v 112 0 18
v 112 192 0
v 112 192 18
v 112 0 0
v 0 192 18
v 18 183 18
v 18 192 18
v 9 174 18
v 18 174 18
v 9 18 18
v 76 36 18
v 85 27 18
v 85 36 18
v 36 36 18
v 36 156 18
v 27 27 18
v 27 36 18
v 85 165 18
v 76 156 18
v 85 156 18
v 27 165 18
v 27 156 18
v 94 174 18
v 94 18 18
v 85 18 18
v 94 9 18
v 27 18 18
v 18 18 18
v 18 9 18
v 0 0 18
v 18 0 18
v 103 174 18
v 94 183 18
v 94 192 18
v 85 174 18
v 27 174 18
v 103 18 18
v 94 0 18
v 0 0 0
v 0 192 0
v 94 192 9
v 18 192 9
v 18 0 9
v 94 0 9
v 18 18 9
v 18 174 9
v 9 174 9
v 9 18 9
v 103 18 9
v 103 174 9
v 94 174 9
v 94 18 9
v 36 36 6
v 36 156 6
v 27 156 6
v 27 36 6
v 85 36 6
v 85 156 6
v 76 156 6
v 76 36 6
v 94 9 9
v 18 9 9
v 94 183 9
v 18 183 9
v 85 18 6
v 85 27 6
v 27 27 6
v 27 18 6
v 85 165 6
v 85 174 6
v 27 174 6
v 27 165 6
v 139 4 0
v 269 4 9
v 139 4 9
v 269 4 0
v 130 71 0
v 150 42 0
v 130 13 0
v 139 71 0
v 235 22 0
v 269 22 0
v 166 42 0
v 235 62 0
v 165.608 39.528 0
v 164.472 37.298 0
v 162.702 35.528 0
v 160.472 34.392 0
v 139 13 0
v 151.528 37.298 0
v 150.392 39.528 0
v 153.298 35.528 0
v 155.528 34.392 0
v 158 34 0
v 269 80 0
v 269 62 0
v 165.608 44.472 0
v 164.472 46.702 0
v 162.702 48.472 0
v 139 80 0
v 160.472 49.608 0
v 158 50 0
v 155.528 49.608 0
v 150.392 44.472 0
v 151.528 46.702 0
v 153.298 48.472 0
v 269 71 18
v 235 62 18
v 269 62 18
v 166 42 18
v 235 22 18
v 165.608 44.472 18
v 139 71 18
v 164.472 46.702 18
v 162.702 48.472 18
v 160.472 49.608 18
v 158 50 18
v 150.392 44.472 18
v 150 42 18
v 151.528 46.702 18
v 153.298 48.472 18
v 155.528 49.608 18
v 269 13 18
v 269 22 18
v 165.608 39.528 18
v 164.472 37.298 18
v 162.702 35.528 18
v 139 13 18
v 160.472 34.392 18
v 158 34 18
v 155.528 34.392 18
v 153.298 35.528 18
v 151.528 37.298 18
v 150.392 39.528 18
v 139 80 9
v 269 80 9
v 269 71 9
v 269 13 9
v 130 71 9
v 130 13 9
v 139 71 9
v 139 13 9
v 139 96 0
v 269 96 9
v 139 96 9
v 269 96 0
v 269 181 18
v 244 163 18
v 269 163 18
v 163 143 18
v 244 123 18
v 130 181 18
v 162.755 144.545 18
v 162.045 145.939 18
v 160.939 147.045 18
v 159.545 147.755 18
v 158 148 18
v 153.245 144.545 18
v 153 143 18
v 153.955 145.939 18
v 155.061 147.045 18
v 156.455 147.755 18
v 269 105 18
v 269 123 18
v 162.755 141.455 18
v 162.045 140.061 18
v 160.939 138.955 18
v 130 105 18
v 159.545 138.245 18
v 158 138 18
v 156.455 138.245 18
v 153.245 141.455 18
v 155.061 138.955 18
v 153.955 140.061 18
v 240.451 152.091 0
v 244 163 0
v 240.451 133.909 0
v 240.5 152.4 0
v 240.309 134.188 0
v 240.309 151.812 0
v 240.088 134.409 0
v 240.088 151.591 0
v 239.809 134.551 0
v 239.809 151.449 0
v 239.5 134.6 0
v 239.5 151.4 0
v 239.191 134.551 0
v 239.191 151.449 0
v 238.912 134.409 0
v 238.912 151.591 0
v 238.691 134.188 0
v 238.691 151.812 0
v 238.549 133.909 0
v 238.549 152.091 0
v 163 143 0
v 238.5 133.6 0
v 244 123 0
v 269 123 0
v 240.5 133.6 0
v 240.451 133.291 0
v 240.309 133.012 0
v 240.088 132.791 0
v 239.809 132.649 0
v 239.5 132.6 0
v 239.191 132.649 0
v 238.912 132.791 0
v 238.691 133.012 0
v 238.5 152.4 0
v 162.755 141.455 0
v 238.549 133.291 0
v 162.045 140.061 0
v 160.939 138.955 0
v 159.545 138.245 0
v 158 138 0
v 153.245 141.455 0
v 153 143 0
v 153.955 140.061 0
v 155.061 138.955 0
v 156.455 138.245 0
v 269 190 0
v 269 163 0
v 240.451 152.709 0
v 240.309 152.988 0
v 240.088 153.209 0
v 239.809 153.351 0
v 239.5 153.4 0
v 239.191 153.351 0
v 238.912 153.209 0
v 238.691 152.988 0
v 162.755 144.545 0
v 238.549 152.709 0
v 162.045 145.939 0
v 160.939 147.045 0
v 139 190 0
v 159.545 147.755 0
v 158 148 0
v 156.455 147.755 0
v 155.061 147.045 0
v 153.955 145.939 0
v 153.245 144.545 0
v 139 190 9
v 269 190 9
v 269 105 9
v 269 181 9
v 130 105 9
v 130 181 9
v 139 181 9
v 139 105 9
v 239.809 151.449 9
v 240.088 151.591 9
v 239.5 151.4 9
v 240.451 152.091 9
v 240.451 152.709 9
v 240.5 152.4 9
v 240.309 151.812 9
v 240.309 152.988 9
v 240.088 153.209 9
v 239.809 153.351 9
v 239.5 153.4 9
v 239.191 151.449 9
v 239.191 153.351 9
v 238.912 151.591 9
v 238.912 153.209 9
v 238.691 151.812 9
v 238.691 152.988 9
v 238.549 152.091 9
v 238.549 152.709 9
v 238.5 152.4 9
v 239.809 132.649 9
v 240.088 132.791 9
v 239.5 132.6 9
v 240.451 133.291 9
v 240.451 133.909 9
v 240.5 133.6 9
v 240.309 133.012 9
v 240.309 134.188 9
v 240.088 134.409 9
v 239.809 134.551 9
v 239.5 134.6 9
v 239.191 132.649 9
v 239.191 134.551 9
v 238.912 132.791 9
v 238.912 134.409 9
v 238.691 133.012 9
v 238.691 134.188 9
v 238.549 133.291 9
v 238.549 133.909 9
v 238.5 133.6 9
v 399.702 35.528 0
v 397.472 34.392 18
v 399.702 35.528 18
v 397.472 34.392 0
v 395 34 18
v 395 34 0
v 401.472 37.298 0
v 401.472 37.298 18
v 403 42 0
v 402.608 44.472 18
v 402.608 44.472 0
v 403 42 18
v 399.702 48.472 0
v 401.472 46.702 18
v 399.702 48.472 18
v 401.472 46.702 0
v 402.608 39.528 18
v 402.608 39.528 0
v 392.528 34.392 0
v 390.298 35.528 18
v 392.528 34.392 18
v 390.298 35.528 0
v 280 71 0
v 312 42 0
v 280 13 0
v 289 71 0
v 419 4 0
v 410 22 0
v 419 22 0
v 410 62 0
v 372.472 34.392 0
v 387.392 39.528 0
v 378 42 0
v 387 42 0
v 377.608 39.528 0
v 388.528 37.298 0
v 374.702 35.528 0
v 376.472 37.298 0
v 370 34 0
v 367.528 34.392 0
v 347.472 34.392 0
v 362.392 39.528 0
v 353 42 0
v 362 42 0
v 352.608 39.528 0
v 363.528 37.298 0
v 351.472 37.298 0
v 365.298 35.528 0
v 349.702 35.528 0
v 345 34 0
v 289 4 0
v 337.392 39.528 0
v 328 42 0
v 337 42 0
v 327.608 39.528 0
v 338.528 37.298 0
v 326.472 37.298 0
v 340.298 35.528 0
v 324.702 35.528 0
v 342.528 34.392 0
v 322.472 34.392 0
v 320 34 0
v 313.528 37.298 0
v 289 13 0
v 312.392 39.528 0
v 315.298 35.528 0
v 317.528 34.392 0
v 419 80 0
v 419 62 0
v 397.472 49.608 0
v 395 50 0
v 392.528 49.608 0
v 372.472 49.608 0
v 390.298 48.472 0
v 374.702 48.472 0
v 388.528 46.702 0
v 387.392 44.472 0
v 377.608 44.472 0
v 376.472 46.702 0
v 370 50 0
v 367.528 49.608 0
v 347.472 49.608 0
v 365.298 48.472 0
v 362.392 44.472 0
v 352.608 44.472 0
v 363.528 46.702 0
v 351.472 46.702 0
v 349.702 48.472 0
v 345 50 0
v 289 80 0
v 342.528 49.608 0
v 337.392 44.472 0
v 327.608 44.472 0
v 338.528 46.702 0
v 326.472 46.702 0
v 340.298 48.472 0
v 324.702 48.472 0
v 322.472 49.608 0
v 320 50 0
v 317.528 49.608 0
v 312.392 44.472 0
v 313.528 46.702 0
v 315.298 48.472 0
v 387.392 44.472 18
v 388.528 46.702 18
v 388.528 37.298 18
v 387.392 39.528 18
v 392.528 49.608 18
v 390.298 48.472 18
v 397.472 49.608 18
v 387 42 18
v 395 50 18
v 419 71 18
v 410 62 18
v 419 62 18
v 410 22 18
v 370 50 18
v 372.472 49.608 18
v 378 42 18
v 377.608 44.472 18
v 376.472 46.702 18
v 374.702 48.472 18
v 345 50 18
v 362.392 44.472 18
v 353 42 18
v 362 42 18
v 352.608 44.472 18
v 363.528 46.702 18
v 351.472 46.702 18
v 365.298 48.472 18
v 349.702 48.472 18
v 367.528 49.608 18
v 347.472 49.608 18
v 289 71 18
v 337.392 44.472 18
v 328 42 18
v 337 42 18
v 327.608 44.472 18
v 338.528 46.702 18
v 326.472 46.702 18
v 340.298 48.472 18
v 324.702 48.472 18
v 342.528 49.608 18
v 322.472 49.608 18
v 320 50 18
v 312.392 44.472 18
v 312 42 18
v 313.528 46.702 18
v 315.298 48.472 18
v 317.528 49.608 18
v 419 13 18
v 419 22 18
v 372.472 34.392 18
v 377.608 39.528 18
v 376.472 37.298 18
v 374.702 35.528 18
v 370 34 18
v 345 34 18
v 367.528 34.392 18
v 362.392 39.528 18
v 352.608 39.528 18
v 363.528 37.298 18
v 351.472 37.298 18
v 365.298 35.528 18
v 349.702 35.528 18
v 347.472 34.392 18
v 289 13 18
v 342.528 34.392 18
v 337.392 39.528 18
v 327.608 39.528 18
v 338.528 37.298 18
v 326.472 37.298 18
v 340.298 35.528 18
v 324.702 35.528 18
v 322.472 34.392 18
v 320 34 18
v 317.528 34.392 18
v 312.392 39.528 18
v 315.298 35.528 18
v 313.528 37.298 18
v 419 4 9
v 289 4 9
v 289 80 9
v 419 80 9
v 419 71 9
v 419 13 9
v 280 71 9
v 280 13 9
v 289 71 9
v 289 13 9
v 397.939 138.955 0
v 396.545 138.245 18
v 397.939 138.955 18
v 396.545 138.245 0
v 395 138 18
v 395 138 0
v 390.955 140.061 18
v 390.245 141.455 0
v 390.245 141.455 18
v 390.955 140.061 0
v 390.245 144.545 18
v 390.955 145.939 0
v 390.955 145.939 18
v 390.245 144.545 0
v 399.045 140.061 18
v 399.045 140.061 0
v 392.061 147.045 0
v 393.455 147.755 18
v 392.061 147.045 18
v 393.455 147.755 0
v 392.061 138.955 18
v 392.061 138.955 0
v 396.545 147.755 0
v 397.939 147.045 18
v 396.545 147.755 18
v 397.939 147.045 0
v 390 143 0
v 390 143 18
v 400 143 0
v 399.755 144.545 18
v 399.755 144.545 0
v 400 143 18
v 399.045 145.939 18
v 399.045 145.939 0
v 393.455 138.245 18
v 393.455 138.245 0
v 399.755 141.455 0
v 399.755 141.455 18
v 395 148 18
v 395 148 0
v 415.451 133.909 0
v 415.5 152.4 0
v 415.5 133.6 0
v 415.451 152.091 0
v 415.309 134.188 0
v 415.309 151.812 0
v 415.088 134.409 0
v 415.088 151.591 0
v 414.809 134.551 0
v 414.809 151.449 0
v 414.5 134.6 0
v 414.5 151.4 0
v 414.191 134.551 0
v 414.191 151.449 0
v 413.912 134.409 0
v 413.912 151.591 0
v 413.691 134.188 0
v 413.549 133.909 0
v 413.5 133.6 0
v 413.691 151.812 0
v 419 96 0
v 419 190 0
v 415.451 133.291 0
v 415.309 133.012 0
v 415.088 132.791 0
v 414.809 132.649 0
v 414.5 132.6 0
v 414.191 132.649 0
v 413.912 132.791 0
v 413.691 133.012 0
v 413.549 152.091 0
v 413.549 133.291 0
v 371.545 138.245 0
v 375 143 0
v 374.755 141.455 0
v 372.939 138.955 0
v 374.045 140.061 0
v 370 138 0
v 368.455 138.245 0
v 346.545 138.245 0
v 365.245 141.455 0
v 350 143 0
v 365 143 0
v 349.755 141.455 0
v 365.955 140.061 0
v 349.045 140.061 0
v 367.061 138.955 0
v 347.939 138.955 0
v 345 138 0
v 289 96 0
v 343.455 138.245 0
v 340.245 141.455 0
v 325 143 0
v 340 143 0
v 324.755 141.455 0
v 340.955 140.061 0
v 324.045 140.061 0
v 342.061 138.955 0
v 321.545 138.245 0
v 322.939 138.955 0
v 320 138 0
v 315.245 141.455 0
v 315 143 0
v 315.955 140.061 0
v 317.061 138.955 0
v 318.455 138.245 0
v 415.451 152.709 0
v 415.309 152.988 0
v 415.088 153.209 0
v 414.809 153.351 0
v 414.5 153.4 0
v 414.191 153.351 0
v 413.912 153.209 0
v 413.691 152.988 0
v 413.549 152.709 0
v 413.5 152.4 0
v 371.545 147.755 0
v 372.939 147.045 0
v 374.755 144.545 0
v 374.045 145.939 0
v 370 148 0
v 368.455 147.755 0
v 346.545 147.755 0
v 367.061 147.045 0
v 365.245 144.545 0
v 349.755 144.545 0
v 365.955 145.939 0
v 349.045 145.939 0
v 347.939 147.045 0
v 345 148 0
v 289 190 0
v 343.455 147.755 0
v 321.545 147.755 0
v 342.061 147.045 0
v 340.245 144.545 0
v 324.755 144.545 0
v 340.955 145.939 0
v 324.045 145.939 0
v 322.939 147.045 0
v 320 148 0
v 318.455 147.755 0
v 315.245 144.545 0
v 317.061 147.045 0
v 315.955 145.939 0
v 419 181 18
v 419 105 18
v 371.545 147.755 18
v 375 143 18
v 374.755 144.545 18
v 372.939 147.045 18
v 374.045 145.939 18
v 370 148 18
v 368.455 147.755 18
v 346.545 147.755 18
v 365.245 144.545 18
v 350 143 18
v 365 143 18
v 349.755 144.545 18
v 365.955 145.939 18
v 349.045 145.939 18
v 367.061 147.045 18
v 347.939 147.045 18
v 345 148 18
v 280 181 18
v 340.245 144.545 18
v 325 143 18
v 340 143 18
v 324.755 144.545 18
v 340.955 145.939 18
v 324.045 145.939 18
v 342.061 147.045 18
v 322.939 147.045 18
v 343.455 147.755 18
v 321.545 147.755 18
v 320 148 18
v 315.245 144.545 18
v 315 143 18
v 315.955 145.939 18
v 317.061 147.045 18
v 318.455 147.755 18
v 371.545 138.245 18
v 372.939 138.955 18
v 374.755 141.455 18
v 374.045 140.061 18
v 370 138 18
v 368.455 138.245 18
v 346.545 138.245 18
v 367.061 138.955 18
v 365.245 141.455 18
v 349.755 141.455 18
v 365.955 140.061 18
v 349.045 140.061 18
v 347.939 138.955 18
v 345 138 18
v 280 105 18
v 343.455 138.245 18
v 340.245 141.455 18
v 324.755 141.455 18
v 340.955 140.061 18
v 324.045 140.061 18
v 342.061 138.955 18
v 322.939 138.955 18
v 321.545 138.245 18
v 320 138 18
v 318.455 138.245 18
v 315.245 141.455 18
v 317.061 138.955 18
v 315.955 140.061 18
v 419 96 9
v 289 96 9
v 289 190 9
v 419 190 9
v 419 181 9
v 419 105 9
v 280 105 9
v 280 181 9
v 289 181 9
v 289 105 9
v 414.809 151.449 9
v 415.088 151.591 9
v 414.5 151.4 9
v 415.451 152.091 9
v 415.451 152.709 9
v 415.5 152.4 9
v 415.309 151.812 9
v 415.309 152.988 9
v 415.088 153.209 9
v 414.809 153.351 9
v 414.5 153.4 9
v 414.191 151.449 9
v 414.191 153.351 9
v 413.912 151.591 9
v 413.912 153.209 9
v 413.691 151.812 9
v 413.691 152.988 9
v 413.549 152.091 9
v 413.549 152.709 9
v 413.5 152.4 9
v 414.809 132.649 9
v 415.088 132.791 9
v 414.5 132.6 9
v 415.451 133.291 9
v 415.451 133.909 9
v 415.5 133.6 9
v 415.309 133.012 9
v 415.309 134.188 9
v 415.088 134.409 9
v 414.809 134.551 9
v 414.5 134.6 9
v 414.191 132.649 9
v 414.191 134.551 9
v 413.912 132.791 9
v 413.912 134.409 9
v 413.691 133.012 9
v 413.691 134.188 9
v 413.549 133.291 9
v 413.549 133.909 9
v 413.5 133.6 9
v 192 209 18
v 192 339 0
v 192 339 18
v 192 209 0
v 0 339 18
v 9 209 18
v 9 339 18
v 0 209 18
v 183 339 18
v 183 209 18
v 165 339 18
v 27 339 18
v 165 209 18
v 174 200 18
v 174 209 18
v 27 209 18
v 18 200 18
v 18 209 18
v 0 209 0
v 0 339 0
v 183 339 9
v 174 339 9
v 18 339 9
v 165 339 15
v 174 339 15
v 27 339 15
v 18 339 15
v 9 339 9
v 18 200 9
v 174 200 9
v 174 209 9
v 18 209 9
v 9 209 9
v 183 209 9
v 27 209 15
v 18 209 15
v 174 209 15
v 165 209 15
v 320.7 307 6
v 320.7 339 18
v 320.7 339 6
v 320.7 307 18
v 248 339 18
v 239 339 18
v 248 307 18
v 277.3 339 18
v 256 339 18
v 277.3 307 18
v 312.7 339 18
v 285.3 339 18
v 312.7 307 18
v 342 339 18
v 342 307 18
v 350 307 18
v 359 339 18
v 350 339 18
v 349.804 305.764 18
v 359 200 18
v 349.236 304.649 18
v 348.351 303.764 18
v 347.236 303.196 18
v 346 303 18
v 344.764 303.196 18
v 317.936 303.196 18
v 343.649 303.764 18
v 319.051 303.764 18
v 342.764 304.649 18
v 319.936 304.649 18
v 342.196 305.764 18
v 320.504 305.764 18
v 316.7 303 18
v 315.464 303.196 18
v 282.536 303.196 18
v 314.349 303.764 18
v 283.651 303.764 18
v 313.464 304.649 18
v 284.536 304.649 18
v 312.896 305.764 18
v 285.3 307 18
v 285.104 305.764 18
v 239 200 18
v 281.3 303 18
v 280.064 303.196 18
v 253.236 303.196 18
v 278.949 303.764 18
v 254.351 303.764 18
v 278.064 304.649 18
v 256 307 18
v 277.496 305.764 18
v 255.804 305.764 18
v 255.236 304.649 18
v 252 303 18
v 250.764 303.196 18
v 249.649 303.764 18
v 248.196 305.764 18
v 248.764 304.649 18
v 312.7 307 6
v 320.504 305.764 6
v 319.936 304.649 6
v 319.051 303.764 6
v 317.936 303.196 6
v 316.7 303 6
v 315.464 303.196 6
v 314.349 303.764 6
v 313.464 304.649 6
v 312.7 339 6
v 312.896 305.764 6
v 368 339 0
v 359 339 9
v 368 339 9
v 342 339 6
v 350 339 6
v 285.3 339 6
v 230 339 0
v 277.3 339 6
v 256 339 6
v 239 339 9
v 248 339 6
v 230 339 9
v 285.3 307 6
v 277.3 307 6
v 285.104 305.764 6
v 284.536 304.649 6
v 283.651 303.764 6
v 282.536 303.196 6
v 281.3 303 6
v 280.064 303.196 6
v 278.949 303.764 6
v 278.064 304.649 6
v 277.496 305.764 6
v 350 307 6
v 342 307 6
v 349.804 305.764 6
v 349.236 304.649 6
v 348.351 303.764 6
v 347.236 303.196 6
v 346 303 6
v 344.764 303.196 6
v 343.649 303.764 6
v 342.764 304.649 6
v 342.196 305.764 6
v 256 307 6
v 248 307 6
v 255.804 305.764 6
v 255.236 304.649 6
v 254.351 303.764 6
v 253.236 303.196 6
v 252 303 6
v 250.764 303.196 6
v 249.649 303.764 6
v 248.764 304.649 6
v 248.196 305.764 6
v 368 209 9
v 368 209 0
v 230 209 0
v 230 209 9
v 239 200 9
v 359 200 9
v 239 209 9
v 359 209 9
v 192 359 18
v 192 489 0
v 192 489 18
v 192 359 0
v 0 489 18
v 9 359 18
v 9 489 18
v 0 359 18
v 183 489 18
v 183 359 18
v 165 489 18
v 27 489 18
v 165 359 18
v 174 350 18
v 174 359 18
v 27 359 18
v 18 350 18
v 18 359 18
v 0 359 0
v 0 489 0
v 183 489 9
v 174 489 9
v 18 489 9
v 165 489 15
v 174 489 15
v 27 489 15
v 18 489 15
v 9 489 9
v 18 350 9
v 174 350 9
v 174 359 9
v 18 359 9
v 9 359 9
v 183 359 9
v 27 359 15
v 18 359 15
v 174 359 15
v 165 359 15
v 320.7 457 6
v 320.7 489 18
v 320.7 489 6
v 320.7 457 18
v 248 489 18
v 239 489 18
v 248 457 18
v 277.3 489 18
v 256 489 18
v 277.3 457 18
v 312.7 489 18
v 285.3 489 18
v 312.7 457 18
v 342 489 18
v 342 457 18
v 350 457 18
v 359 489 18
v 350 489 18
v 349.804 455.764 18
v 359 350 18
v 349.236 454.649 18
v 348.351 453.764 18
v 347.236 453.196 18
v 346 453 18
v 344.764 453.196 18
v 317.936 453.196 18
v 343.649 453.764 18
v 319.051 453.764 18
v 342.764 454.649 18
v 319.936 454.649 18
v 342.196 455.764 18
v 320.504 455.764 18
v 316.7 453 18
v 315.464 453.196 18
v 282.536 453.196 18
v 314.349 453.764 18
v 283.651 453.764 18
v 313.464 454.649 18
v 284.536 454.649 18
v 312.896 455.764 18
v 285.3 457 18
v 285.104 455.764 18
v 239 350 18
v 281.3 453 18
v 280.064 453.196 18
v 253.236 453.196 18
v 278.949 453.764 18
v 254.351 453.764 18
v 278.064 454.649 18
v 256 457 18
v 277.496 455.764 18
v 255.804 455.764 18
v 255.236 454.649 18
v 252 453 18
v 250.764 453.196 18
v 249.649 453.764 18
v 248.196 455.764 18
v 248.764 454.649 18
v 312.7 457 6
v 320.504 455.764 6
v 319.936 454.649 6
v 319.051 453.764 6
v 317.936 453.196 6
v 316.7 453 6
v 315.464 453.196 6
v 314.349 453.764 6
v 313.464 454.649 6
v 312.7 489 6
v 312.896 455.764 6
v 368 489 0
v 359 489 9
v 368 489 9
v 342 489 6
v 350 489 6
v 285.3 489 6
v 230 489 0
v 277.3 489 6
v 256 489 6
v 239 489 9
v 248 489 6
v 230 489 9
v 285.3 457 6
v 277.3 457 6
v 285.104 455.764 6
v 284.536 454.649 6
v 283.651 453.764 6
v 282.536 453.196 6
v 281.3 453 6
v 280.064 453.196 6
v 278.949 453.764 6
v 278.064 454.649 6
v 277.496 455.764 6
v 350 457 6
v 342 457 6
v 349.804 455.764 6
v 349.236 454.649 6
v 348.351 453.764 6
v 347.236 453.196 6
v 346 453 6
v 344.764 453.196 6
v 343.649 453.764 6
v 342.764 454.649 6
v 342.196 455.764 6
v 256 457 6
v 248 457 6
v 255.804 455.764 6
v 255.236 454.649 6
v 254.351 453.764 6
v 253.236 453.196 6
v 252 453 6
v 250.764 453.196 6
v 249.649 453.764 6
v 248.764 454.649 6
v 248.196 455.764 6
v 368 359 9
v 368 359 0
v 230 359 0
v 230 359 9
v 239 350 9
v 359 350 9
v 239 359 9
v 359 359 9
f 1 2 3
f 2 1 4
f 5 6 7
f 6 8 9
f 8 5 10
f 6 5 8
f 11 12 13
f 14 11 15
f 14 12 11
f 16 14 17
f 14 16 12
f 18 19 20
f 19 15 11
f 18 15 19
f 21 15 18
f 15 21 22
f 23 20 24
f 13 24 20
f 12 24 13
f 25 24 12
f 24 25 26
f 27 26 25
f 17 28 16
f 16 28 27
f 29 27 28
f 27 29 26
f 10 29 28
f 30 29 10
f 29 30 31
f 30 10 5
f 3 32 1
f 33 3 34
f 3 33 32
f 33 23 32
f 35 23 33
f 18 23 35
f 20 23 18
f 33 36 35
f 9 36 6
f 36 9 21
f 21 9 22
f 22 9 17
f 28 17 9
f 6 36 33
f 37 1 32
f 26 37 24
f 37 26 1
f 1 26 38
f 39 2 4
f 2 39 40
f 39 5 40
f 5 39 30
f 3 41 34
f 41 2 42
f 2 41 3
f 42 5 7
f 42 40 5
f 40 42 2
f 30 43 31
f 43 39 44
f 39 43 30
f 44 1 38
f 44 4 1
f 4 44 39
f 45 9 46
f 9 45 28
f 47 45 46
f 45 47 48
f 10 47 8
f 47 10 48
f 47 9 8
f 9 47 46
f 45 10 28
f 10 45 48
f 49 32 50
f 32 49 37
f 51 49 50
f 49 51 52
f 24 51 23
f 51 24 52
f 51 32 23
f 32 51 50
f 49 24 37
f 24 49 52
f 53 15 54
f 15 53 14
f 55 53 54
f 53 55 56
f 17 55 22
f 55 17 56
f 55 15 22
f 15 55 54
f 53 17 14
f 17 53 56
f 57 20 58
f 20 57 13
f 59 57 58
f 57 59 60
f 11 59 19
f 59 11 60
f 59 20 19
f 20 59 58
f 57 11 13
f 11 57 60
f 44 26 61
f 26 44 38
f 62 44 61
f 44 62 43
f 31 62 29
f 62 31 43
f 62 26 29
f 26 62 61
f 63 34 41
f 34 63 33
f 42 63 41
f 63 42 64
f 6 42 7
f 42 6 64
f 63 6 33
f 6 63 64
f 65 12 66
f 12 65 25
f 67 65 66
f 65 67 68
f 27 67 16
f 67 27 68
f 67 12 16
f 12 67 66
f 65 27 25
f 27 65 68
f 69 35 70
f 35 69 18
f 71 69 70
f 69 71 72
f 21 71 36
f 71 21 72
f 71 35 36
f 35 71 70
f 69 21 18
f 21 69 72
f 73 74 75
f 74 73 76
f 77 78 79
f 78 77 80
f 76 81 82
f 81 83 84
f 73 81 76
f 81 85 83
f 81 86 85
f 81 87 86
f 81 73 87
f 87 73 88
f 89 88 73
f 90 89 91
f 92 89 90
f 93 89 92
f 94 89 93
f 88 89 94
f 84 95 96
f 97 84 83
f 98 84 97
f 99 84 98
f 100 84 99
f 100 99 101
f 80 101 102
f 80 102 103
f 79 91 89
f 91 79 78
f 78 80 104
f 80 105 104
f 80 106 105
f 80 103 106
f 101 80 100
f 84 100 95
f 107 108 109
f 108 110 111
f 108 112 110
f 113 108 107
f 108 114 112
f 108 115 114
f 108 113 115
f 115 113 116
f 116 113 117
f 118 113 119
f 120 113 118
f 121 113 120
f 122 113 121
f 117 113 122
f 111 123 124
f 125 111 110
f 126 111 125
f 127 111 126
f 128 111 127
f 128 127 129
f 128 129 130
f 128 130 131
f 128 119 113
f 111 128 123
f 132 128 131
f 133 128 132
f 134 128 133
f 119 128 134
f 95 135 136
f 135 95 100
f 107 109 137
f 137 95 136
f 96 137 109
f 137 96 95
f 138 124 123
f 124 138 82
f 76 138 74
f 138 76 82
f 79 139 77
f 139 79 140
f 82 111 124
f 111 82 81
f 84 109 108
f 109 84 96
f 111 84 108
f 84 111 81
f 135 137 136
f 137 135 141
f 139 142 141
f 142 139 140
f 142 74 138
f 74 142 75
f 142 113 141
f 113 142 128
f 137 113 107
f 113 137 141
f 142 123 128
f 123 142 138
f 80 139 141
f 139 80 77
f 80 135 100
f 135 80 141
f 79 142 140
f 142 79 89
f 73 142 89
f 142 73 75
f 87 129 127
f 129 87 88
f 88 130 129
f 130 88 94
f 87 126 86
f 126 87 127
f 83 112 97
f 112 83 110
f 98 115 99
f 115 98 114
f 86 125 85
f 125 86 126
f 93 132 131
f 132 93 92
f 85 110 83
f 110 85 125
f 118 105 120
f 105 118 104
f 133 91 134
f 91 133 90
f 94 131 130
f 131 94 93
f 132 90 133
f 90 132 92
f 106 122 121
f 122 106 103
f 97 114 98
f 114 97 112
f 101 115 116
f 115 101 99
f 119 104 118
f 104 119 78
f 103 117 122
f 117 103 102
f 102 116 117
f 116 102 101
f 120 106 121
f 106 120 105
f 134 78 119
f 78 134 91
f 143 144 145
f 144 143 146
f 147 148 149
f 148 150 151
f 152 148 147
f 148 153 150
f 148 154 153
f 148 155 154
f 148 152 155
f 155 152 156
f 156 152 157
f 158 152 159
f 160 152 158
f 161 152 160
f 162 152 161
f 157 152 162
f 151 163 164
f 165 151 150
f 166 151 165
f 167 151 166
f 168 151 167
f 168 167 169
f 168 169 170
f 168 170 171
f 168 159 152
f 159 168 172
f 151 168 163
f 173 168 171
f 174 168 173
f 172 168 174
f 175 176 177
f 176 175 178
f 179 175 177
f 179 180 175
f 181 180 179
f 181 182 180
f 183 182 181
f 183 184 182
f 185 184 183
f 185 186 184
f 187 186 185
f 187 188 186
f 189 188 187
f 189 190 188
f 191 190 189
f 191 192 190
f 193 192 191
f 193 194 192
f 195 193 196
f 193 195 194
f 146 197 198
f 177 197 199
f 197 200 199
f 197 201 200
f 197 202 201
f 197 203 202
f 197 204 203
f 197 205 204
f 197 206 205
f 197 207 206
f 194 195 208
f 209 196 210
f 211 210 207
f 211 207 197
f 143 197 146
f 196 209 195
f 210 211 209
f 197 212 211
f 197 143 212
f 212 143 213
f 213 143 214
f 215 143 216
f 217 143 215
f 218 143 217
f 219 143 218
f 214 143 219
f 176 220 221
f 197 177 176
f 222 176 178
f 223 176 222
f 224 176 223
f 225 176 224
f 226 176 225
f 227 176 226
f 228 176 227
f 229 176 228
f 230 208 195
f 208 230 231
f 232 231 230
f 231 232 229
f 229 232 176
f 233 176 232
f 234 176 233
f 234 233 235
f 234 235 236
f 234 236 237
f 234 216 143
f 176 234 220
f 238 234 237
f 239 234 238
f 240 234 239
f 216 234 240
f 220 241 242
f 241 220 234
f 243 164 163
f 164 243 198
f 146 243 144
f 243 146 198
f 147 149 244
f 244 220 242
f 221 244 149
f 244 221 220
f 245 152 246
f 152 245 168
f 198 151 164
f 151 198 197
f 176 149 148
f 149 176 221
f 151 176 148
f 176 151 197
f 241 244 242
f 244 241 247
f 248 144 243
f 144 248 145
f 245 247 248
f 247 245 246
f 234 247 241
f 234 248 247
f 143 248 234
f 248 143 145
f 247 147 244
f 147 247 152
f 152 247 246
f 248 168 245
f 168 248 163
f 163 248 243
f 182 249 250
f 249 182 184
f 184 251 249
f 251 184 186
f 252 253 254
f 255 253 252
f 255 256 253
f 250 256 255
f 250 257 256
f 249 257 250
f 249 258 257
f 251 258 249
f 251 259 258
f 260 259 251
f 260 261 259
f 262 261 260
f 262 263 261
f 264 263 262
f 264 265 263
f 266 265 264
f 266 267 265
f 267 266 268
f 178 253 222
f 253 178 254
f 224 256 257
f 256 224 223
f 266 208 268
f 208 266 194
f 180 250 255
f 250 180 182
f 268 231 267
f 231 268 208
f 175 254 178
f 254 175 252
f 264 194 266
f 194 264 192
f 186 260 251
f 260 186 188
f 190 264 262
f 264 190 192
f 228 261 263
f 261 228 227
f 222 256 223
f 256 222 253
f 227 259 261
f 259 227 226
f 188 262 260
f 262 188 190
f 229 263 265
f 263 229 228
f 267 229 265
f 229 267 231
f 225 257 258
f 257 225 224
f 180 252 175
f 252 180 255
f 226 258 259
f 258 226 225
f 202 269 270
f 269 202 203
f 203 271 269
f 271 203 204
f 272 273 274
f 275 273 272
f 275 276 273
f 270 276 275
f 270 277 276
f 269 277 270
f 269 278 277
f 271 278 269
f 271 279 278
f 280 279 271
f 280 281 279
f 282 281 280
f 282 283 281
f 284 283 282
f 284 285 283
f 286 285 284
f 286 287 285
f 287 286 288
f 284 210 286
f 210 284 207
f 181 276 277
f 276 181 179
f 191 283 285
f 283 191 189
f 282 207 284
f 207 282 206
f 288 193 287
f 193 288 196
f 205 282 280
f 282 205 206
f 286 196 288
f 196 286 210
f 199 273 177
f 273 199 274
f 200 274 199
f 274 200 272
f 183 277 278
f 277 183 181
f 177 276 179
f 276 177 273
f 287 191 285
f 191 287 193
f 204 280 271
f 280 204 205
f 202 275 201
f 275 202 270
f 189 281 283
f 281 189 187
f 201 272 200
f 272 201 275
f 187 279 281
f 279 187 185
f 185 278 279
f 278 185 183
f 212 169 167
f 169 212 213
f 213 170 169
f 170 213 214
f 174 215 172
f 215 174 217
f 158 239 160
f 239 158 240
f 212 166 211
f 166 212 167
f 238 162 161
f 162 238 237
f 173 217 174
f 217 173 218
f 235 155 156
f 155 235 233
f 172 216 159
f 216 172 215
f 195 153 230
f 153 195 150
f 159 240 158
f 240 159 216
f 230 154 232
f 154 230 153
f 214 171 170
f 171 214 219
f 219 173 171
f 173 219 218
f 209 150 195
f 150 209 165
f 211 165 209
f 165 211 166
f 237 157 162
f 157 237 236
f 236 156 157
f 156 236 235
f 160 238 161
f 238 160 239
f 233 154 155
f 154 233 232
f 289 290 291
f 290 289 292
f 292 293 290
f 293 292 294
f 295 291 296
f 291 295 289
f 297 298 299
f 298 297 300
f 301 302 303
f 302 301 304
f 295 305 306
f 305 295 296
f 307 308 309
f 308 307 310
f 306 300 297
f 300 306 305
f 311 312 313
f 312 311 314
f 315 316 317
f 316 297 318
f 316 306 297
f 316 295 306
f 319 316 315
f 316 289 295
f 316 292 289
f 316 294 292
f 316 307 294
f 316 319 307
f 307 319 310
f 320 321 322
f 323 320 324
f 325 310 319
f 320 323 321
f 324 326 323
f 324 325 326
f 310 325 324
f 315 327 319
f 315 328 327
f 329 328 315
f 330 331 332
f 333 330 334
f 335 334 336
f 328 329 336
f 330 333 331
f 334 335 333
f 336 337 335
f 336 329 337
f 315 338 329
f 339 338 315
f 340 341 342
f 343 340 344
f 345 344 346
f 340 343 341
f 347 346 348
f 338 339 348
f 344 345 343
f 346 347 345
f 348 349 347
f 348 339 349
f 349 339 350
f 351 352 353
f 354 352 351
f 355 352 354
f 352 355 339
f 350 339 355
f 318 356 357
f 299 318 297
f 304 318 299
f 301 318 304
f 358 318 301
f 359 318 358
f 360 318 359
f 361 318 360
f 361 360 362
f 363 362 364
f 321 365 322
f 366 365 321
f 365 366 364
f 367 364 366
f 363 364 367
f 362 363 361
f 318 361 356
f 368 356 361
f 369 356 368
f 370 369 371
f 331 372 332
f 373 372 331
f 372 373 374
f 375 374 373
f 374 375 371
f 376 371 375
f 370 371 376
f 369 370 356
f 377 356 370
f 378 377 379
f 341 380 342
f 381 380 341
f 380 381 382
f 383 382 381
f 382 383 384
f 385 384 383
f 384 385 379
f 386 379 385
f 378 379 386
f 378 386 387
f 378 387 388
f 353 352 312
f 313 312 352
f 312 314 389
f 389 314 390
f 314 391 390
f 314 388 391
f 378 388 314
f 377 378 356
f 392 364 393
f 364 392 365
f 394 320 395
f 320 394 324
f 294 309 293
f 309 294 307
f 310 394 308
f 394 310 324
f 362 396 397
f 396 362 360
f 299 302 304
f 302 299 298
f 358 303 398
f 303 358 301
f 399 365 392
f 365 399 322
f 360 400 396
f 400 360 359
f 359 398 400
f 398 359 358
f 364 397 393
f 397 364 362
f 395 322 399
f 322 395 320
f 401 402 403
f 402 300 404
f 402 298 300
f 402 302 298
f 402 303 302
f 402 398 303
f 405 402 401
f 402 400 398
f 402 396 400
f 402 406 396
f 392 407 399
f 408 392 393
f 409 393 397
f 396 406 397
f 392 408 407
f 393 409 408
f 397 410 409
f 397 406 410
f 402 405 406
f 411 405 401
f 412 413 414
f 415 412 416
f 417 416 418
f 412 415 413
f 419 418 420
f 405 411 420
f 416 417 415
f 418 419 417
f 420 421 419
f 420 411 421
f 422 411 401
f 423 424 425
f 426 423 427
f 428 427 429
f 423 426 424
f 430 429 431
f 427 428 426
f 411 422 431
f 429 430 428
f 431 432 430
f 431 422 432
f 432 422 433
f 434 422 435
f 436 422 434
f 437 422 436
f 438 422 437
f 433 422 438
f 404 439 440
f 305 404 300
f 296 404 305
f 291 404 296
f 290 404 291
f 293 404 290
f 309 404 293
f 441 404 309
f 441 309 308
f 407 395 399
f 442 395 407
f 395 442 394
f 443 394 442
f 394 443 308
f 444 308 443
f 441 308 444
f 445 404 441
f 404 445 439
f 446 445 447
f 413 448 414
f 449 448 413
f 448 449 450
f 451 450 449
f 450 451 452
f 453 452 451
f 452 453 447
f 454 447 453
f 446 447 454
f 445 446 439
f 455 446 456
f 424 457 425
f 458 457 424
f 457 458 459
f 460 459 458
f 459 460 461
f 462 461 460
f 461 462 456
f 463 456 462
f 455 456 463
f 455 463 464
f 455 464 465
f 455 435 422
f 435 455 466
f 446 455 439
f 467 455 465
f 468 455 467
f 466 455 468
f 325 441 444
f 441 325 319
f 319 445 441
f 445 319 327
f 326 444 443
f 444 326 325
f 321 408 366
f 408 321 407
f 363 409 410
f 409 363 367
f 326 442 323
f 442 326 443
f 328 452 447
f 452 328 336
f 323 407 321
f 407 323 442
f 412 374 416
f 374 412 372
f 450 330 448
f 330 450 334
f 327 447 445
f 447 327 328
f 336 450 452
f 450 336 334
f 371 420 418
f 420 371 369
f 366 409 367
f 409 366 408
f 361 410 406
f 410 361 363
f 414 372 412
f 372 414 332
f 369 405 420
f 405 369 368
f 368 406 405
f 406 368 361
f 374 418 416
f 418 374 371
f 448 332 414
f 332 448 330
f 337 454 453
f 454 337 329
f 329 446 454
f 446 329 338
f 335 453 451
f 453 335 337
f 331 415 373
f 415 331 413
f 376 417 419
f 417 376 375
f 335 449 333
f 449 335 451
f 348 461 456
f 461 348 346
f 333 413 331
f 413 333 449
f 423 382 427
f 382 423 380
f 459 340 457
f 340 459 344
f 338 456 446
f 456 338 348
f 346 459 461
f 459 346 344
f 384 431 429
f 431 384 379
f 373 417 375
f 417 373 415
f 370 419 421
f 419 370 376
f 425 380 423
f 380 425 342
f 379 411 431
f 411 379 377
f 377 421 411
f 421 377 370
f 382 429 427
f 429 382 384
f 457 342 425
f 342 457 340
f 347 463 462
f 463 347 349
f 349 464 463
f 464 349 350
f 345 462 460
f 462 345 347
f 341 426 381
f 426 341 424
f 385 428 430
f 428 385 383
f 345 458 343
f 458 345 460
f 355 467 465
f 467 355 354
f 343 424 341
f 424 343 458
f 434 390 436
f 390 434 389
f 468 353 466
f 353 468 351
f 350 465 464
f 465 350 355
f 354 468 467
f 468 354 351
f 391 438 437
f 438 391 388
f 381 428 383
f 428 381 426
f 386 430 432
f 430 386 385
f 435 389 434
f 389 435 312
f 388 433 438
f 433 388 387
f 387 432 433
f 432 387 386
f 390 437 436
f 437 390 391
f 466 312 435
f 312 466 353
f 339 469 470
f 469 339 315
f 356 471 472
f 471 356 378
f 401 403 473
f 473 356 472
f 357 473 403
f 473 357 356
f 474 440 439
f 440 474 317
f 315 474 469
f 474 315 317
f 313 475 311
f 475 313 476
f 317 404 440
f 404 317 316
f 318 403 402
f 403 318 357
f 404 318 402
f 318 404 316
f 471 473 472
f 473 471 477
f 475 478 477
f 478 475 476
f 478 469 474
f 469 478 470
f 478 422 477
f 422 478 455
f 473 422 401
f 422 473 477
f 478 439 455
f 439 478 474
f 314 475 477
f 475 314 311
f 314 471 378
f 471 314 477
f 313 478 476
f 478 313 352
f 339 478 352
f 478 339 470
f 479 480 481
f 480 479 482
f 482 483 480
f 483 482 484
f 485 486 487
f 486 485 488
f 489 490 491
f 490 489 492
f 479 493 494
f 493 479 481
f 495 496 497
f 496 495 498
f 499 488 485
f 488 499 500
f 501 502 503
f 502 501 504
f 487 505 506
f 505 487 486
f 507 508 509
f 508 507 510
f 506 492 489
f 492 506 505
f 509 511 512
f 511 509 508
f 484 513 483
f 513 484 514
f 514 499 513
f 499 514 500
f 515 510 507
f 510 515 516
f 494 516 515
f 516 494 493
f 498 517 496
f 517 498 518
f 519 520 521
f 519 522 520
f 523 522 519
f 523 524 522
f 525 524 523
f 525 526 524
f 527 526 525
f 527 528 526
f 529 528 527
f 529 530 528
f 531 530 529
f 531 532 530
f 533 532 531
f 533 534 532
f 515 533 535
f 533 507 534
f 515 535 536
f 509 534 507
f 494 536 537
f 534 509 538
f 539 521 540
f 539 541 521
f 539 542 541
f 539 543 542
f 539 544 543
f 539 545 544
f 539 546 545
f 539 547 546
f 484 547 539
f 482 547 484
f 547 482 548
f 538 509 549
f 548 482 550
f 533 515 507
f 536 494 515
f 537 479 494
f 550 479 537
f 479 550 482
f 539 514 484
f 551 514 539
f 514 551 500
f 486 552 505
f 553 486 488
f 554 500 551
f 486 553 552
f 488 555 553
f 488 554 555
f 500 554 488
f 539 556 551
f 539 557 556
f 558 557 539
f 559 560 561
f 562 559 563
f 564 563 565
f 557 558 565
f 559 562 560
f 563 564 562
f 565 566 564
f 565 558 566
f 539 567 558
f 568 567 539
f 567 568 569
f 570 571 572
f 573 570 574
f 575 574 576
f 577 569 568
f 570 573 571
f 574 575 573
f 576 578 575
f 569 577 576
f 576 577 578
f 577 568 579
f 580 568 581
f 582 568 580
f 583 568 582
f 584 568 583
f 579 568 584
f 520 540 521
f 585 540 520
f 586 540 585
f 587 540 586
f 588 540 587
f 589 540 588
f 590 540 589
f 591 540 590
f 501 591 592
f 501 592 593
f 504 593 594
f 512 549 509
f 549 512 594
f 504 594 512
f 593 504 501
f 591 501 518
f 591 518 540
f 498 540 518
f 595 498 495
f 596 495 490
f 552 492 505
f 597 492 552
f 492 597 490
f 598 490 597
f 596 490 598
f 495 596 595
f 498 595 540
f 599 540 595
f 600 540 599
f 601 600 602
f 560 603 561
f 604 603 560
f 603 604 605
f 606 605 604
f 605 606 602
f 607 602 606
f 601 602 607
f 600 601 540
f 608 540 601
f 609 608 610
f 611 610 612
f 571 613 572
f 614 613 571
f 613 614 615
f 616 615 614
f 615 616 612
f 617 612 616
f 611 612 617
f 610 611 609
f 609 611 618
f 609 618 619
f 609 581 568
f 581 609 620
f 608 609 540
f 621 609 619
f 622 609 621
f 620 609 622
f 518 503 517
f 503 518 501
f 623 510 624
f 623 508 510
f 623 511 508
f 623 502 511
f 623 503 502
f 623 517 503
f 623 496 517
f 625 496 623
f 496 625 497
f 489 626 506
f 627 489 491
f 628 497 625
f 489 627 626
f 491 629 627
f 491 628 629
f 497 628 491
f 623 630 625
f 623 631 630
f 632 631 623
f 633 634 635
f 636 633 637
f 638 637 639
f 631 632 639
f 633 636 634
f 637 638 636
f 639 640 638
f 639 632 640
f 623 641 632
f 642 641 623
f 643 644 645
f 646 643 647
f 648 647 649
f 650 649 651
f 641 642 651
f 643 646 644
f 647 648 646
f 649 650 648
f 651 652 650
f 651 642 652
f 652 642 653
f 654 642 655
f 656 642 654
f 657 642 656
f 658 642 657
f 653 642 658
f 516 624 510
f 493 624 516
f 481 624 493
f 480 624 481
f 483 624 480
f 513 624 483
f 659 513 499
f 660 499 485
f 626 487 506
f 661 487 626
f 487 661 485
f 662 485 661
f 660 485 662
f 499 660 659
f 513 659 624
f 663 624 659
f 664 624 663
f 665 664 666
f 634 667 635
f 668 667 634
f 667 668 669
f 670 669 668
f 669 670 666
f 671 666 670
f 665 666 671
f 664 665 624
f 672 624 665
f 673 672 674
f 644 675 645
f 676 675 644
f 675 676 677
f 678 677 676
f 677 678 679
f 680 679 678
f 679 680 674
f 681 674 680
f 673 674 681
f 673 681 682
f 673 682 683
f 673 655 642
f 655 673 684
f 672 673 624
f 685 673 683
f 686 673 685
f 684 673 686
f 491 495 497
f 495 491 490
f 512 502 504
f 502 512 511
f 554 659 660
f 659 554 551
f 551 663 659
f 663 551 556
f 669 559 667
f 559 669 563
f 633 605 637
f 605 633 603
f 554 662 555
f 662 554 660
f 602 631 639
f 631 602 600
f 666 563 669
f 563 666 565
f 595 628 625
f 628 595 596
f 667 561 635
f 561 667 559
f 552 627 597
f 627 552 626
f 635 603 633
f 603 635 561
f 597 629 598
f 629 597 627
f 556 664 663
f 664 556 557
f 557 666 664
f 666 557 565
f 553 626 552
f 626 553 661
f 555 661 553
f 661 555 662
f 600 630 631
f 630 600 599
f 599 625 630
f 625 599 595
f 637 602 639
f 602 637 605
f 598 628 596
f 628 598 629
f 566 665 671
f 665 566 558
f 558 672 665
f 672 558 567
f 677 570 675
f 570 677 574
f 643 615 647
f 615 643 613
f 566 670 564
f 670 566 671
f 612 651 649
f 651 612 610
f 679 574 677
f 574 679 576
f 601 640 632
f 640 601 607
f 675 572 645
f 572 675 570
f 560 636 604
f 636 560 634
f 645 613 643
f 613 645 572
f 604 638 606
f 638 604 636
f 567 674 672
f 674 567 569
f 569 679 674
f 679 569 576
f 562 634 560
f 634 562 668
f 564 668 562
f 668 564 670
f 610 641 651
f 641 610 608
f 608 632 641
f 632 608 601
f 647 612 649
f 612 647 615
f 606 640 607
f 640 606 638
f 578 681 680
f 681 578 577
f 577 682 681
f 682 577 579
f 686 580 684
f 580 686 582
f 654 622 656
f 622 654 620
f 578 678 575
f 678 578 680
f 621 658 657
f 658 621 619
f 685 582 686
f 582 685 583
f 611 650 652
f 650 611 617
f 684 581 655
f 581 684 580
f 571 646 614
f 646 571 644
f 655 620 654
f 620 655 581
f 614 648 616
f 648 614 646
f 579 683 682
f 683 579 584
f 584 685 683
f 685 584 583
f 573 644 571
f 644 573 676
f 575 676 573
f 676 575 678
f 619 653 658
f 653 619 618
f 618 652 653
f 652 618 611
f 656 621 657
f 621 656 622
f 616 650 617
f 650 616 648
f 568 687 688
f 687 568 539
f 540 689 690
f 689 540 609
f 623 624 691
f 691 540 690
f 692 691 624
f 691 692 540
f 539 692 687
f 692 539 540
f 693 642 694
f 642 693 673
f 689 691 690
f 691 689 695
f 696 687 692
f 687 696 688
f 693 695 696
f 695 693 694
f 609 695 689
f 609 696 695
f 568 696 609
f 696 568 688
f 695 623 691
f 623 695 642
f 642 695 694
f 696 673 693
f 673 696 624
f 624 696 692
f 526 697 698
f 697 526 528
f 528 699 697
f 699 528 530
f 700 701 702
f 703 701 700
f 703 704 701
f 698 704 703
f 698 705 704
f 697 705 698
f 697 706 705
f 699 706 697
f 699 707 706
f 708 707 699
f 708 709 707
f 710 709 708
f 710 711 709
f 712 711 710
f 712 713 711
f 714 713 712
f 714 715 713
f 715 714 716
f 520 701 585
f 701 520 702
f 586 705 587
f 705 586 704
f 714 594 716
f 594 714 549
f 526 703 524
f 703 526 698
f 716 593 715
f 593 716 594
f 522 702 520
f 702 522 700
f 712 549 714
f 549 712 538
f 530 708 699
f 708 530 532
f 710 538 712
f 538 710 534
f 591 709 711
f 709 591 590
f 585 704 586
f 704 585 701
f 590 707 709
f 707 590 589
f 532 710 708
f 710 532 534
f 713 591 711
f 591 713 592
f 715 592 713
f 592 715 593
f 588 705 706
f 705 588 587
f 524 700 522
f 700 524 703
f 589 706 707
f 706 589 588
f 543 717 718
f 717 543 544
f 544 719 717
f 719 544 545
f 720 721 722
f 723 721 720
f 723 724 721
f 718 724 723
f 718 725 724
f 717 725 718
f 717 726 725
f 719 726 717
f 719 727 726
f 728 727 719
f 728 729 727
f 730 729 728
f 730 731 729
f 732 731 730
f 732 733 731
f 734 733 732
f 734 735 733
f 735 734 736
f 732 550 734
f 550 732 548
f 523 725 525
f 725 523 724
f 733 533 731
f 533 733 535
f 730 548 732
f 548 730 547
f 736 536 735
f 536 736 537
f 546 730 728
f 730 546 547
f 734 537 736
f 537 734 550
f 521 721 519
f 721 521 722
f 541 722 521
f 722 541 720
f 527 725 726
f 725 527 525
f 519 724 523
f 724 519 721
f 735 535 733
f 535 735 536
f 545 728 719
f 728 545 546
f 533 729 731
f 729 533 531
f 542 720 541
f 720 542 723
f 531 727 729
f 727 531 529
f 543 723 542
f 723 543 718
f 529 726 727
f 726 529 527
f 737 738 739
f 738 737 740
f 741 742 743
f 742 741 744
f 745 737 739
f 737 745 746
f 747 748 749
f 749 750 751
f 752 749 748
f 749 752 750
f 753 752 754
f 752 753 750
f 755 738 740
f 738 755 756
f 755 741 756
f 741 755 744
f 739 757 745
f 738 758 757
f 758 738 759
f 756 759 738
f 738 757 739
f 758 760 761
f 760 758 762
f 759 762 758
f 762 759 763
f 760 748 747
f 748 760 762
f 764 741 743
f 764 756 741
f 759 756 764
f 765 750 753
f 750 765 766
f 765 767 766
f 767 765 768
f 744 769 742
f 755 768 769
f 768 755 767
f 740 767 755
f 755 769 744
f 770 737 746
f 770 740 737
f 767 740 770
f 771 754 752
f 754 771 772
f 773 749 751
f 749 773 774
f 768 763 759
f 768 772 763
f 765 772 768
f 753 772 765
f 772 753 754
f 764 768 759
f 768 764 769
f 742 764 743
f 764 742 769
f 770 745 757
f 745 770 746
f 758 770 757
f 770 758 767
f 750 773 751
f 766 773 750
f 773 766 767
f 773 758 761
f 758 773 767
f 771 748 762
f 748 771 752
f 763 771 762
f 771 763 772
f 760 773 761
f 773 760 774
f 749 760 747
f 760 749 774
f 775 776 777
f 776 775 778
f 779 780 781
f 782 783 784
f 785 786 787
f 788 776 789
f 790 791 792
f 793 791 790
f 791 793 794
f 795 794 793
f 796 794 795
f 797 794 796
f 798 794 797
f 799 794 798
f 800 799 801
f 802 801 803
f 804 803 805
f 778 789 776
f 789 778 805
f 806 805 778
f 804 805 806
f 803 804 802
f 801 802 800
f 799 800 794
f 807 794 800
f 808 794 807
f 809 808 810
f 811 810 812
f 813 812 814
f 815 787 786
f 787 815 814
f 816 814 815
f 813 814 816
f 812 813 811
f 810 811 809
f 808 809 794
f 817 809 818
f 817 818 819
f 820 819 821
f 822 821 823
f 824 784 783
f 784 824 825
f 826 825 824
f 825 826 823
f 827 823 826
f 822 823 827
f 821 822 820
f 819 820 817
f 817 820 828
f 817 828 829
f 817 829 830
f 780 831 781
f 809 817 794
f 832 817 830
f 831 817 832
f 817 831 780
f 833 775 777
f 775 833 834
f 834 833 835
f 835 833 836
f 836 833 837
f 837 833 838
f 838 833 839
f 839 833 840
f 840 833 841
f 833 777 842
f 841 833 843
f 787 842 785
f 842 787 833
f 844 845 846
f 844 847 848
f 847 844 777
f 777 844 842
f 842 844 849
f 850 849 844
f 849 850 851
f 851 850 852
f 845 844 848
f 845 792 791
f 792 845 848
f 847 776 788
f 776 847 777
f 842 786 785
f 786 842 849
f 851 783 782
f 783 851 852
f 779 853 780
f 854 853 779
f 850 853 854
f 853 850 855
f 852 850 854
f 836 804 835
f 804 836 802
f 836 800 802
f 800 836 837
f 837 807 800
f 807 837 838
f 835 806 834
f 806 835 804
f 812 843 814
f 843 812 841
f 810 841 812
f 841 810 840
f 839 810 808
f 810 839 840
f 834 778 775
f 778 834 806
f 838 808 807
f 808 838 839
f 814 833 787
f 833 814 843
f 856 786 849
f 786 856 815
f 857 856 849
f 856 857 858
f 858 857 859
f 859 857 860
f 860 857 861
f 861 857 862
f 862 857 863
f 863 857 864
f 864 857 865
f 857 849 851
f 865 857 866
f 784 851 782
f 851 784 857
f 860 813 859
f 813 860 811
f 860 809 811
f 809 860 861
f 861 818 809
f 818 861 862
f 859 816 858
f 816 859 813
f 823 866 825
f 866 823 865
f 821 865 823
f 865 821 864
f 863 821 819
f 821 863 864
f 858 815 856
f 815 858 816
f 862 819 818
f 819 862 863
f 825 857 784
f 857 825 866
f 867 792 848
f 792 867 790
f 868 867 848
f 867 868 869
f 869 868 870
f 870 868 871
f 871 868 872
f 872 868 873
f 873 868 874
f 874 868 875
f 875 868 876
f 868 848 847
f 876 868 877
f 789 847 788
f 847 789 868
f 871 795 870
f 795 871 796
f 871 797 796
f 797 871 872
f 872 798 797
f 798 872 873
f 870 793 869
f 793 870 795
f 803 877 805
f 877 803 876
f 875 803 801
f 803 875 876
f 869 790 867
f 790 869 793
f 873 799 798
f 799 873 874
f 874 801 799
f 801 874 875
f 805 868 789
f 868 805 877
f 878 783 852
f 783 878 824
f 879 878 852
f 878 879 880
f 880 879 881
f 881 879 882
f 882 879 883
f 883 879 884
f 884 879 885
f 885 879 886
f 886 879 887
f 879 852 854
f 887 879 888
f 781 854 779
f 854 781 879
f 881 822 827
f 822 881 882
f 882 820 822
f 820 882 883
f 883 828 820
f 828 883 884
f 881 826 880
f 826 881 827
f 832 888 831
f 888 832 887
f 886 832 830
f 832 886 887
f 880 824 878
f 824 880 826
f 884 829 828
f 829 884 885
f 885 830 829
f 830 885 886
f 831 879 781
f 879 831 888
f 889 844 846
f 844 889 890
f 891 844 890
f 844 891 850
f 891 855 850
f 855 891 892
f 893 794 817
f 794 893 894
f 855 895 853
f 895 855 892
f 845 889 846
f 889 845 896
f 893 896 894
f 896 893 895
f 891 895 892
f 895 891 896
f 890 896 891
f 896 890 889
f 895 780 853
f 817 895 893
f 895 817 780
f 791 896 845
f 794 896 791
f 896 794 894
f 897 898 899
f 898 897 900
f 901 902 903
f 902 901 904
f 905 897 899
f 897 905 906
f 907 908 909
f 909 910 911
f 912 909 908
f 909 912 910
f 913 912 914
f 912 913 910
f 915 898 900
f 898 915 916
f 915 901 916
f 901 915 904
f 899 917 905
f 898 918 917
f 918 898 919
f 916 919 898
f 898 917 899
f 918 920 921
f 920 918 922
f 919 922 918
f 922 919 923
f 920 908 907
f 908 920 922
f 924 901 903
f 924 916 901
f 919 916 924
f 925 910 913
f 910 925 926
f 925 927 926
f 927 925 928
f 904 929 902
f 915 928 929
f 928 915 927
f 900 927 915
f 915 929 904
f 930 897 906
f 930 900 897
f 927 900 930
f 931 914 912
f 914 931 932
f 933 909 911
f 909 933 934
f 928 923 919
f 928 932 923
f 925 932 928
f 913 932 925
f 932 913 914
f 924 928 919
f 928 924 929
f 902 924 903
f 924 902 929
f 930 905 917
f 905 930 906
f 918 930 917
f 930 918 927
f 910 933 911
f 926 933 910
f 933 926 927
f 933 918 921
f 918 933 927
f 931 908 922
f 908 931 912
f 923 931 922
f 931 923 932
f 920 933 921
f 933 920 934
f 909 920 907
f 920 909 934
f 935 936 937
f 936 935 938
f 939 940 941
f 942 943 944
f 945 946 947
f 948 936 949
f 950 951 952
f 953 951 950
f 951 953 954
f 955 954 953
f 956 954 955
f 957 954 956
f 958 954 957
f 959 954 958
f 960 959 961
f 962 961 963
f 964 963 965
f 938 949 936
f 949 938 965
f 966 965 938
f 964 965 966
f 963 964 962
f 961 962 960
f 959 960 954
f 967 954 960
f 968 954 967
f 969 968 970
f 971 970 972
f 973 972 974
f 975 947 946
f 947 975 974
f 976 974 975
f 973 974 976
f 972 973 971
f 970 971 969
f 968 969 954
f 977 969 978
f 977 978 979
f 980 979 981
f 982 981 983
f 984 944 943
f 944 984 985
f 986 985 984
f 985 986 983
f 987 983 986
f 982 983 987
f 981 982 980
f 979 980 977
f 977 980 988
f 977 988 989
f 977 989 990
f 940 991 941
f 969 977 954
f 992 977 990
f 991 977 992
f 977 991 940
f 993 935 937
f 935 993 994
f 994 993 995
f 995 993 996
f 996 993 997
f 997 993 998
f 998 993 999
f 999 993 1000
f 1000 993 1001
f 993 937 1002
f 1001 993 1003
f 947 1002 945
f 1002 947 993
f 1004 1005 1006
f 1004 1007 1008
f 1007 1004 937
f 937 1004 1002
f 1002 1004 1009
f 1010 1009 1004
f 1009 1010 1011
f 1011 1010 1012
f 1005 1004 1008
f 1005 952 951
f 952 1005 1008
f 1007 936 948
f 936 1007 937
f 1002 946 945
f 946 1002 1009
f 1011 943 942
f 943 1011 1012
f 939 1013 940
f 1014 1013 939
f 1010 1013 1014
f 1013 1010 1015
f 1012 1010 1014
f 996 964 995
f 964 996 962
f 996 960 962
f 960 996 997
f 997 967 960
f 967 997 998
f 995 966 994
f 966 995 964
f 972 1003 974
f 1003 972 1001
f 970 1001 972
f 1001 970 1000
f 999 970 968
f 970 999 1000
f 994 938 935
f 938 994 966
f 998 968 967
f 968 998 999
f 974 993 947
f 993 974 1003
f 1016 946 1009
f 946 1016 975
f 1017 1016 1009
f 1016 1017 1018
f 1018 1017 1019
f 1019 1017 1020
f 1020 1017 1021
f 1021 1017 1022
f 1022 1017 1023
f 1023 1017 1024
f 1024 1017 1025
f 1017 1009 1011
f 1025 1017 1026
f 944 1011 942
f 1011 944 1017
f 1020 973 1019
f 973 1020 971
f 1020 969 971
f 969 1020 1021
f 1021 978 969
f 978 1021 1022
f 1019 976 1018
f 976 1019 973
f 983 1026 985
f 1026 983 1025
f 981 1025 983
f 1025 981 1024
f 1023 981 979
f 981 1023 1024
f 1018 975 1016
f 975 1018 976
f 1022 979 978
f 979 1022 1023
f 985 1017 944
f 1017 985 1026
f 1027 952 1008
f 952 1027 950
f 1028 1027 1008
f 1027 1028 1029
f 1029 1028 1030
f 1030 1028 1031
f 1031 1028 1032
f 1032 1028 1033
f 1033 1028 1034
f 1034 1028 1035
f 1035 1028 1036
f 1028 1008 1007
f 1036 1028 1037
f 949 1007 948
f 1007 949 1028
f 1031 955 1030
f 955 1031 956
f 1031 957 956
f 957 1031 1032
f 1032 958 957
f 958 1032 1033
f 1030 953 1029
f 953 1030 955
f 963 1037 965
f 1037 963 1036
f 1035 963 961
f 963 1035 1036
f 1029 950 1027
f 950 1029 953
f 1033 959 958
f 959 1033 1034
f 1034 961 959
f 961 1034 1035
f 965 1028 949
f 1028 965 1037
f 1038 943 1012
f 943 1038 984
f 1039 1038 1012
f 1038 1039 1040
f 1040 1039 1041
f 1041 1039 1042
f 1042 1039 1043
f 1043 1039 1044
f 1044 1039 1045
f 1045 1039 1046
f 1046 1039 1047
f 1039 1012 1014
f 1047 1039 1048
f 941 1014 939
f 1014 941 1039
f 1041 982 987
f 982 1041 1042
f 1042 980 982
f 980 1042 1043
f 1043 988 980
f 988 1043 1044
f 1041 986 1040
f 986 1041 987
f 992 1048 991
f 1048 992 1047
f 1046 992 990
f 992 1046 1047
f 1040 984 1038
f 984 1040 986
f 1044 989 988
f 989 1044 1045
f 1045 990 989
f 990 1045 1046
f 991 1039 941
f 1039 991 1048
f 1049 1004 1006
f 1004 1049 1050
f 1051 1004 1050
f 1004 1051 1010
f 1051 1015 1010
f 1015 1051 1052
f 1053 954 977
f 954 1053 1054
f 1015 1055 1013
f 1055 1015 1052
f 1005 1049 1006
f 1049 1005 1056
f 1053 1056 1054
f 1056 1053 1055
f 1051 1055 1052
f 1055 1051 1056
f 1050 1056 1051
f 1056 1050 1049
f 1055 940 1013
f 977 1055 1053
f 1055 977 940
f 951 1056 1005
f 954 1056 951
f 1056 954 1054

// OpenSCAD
use <../minitub.scad>;

module parts () {
plate();

mirror([0, 0, 180]) translate([130, 80, -18]) rotate(-90)
    panel_back_inner();

translate([130, 190, 0]) rotate(-90)
    panel_back_outer();

mirror([0, 0, 180]) translate([280, 80, -18]) rotate(-90)
    panel_front_inner();

translate([280, 190, 0]) rotate(-90)
    panel_front_outer();

translate([0, 200, 0])
    panel_side_outer();

translate([230, 200, 0])
    panel_side_inner();

translate([0, 350, 0])
    panel_side_outer();

translate([230, 350, 0])
    panel_side_inner();
}

//projection(cut = true) translate([0,0, -10]) parts();
//projection(cut = true) translate([0,0, -1]) parts();
//projection(cut = true) translate([0,0, -16]) parts();
parts();
